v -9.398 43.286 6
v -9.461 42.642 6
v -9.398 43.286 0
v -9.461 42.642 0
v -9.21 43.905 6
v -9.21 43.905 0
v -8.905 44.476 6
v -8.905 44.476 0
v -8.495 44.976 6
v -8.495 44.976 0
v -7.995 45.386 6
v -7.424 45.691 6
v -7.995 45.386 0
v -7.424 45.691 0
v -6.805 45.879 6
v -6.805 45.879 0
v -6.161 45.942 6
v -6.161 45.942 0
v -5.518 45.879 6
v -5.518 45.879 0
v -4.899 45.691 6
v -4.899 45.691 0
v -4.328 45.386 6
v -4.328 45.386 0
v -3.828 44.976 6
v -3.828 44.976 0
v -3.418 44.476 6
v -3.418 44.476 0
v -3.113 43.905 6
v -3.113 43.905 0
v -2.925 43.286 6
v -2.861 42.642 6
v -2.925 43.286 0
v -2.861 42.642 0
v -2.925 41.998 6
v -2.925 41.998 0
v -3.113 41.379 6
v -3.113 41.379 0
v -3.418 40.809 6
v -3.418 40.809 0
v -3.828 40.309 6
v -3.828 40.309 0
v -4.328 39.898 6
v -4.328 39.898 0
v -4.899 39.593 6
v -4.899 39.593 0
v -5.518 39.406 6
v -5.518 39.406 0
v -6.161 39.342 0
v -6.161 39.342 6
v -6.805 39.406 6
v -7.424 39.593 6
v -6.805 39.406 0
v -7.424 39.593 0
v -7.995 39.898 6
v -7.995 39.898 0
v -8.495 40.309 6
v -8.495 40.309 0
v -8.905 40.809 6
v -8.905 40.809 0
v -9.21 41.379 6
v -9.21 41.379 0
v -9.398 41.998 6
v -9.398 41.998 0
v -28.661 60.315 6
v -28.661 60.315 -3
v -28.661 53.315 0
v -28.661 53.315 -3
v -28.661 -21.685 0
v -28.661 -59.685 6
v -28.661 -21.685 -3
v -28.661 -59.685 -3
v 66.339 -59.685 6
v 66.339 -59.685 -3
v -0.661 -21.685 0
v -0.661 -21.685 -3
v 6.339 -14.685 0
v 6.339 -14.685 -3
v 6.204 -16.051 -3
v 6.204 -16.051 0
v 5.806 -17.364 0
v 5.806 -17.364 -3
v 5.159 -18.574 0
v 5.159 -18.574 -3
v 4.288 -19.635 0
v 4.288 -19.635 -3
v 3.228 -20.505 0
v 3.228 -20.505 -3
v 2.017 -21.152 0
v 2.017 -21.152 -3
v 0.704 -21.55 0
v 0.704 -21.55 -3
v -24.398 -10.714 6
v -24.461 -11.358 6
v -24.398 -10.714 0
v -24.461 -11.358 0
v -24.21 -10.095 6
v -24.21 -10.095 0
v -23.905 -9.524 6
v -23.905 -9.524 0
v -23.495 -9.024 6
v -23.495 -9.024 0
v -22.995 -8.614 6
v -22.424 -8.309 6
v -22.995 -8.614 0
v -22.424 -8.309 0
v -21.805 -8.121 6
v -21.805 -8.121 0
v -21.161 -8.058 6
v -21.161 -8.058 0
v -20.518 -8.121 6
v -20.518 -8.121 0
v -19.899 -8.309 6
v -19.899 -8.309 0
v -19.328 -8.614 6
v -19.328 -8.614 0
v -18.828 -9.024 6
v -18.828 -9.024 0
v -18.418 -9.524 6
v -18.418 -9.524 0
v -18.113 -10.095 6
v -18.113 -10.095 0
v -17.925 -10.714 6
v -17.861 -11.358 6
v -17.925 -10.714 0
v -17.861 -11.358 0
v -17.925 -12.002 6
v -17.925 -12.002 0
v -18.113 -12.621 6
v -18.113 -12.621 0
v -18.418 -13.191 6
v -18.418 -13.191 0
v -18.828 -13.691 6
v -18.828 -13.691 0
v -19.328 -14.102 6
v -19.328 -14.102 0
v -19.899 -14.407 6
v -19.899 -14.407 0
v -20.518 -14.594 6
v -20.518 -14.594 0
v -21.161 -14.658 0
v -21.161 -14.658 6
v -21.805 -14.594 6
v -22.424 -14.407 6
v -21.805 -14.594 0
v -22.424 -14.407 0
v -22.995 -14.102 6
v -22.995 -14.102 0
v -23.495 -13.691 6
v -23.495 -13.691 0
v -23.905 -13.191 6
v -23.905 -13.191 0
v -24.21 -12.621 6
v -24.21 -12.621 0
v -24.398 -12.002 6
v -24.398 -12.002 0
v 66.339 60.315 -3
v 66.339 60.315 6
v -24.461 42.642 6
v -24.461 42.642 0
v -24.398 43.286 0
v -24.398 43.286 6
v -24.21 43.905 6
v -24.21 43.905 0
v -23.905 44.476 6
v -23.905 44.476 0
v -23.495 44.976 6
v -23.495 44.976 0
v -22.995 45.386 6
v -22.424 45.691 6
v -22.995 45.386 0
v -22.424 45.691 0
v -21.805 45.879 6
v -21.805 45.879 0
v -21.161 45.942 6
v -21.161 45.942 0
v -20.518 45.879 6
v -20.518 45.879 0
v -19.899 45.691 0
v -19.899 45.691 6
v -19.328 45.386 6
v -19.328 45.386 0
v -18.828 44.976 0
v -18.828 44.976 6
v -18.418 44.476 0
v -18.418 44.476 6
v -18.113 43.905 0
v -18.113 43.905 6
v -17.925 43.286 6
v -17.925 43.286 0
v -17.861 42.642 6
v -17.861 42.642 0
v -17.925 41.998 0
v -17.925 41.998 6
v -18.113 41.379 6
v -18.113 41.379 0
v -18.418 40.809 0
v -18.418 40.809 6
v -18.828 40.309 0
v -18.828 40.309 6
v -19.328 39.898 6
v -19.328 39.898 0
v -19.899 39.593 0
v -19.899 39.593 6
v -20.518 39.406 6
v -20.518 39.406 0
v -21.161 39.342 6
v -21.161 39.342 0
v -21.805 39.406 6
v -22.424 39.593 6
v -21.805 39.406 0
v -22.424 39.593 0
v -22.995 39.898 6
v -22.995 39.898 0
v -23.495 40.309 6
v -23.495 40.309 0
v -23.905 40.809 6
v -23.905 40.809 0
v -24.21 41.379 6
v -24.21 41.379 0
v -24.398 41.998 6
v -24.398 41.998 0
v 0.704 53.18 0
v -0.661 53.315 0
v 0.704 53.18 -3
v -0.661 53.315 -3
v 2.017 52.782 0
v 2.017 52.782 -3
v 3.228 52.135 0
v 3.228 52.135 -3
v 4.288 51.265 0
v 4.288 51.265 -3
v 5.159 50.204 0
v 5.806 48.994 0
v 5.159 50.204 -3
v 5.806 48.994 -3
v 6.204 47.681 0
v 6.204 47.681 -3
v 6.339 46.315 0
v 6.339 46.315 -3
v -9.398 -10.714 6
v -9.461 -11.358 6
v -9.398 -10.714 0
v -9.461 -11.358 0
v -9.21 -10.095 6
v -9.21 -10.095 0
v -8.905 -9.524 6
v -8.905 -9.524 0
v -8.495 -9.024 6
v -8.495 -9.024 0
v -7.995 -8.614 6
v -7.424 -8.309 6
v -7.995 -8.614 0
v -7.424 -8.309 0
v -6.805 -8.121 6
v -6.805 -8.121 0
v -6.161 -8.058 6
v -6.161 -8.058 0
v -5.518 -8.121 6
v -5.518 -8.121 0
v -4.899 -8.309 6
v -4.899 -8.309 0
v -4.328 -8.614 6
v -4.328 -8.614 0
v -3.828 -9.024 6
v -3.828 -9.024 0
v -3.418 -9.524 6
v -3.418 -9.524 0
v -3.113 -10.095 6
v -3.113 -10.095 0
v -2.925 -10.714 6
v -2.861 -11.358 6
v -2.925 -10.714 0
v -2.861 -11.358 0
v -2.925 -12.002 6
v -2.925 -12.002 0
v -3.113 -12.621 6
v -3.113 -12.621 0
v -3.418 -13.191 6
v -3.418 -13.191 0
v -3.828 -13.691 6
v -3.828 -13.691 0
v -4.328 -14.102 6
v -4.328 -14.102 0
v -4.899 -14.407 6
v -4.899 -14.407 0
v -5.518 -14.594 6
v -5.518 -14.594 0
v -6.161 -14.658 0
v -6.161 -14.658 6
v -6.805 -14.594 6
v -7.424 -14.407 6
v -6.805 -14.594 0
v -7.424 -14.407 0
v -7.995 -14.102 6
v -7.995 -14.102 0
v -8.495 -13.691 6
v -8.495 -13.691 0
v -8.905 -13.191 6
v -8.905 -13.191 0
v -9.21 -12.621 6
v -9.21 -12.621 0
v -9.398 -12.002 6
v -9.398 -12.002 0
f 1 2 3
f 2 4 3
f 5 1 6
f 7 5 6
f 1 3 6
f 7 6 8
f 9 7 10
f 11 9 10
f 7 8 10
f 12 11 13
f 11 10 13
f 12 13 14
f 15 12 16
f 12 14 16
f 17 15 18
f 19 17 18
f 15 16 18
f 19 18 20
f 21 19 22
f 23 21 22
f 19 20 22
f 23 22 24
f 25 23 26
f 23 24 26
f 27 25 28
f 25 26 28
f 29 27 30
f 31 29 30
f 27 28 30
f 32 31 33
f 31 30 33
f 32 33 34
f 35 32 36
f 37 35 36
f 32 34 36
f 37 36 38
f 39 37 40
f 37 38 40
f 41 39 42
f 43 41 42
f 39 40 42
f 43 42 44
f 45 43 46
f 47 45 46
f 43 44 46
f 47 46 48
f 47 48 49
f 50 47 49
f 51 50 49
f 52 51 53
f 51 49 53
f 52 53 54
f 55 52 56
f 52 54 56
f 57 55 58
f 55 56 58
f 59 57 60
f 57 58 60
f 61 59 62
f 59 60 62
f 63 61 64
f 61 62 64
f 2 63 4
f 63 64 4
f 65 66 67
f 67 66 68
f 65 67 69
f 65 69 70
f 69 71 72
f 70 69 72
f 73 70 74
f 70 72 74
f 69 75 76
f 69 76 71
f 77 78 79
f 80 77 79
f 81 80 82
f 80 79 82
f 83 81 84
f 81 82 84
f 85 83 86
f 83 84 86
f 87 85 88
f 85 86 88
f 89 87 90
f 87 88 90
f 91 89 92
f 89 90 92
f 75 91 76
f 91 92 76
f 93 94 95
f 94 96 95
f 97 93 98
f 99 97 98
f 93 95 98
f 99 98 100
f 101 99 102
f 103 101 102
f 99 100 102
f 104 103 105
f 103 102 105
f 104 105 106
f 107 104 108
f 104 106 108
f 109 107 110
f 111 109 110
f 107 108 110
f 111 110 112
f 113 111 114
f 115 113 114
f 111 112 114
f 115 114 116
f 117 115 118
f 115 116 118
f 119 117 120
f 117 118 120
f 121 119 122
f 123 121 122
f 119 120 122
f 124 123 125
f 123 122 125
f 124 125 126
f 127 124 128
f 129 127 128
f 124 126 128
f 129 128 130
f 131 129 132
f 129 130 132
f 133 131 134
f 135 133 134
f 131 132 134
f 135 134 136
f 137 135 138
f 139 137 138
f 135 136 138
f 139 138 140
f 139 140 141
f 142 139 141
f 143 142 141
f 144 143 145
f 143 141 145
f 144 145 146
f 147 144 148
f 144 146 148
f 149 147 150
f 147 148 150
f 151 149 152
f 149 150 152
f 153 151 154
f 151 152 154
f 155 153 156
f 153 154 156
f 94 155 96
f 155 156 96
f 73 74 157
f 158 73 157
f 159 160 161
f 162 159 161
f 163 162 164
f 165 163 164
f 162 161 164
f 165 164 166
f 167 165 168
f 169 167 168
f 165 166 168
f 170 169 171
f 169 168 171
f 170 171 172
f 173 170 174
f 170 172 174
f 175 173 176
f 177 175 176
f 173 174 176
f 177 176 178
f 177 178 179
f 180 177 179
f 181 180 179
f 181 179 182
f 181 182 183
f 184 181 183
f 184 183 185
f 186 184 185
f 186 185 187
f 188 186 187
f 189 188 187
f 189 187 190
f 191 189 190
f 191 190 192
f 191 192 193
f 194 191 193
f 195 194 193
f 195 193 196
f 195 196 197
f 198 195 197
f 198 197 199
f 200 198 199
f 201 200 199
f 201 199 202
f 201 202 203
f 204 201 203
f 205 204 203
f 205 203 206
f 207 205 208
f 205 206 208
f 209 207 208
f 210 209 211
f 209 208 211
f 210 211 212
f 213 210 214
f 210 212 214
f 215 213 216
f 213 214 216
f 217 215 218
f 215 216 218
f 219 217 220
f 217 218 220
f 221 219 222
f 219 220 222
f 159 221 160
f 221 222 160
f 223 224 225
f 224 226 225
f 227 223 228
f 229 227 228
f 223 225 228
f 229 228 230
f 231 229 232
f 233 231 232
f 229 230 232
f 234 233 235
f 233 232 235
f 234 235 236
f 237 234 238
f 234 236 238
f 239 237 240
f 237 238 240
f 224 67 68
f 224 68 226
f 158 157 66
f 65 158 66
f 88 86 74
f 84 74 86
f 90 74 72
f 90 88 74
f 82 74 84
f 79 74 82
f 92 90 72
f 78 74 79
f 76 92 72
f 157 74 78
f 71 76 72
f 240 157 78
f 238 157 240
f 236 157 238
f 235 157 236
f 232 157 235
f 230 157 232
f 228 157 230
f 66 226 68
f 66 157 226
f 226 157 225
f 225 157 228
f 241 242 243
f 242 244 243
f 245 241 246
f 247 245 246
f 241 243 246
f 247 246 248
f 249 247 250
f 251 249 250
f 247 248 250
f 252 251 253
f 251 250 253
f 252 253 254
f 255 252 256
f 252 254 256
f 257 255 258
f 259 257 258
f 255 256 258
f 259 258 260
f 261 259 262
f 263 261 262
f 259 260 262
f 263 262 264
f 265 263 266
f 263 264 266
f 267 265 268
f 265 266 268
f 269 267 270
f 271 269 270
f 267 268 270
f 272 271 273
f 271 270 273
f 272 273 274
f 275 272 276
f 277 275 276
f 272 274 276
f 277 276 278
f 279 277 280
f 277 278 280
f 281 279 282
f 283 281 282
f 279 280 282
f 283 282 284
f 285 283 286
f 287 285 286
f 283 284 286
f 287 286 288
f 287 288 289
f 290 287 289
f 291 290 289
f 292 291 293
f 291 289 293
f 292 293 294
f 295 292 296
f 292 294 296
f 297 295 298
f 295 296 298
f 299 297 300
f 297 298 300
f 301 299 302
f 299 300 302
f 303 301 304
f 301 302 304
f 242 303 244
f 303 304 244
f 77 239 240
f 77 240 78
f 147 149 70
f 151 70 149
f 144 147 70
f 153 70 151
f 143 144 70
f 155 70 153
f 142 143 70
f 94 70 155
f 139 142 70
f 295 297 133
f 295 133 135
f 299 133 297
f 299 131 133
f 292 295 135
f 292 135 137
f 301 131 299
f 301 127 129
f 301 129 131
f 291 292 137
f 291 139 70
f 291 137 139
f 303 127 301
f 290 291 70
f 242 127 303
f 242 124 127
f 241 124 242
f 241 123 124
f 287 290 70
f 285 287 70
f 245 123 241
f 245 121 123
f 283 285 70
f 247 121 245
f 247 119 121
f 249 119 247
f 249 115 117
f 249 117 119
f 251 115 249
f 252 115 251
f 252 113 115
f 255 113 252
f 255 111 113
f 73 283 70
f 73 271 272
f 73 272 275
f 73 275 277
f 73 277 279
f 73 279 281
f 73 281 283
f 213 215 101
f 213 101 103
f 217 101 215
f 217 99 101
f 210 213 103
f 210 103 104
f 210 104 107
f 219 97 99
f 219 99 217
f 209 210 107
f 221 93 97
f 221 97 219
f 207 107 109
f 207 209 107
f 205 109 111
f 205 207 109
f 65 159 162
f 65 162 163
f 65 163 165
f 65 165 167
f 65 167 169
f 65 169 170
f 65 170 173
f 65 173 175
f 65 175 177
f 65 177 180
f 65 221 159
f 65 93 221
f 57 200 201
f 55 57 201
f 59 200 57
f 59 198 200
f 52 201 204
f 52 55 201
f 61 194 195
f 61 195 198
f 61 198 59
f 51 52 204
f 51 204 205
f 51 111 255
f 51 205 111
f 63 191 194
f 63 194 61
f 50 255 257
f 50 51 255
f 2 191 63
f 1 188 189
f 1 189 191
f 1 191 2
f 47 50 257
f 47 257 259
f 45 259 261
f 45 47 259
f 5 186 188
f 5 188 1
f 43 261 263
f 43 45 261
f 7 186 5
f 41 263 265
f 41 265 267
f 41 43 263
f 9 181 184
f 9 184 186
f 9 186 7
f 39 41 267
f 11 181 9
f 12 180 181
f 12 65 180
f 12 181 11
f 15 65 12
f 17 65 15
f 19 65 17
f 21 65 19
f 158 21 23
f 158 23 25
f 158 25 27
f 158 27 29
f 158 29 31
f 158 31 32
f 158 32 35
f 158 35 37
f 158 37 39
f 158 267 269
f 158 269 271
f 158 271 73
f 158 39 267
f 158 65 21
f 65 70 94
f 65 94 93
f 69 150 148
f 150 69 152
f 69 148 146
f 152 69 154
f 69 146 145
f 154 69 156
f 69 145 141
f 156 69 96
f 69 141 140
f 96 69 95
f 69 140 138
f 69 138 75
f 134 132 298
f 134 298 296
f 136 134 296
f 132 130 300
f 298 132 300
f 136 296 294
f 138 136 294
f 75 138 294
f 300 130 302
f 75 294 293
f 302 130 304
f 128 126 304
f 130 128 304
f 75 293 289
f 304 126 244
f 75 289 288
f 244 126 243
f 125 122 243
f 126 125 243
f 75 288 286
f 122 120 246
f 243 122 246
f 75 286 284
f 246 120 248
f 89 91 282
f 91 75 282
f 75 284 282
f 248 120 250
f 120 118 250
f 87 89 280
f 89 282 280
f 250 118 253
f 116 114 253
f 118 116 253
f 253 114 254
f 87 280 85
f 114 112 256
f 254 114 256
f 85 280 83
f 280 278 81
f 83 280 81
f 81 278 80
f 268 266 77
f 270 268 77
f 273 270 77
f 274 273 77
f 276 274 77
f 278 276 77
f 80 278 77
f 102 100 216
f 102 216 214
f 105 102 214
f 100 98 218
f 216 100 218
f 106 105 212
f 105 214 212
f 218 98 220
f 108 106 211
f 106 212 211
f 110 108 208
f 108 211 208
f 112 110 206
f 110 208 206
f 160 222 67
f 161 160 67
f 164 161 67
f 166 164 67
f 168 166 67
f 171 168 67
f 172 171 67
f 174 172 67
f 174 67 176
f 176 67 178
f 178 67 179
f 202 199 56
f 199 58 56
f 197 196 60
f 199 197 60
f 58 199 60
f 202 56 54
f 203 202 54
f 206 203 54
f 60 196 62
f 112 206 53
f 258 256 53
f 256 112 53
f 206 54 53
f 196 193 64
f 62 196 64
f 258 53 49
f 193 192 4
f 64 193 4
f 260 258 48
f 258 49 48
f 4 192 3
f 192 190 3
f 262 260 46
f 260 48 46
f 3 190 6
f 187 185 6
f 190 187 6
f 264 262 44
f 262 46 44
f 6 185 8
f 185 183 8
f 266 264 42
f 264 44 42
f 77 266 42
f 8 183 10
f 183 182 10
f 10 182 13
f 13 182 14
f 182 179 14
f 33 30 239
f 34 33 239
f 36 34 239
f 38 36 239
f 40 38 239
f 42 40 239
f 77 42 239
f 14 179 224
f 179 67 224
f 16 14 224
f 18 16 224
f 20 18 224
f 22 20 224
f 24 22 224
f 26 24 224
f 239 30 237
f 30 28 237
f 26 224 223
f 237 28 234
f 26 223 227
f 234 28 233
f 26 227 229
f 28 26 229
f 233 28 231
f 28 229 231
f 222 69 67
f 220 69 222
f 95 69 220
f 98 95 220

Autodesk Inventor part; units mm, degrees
ref_plane "YZ Plane" through (0, 0, 0) normal (1, 0, 0) x (0, 1, 0)
ref_plane "XZ Plane" through (0, 0, 0) normal (0, 1, 0) x (-1, 0, 0)
ref_plane "XY Plane" through (0, 0, 0) normal (0, 0, 1) x (1, 0, 0)
sketch "Sketch1" plane through (0, 0, 0) normal (0, 0, 1) x (1, 0, 0)
  line L0 (-28.6614, -59.685) -> (66.3386, -59.685)
  line L1 (66.3386, -59.685) -> (66.3386, 60.315)
  line L2 (66.3386, 60.315) -> (-28.6614, 60.315)
  line L3 (-28.6614, 60.315) -> (-28.6614, -59.685)
  point P0 (0, 0)
  dimension "d0" = 120
  dimension "d1" = 95
extrude "Extrusion1" add sketch "Sketch1" along normal blind 6
sketch "Sketch3" plane through (0, 0, 0) normal (0, 0, -1) x (-1, 0, 0)
  line L0 (-66.3386, 60.315) -> (28.6614, 60.315) projected
  line L1 (28.6614, 60.315) -> (28.6614, 53.315)
  line L2 (28.6614, 60.315) -> (28.6614, -59.685) projected
  line L3 (28.6614, 53.315) -> (-6.3386, 53.315)
  line L4 (-6.3386, 53.315) -> (-6.3386, -21.685)
  line L5 (-6.3386, -21.685) -> (28.6614, -21.685)
  line L6 (28.6614, -21.685) -> (28.6614, -59.685)
  line L7 (28.6614, -59.685) -> (-66.3386, -59.685) projected
  line L8 (28.6614, -59.685) -> (-66.3386, -59.685)
  line L9 (-66.3386, -59.685) -> (-66.3386, 60.315) projected
  line L10 (-66.3386, -59.685) -> (-66.3386, 60.315)
  line L11 (-66.3386, 60.315) -> (28.6614, 60.315)
  point P0 (0, 0)
  dimension "d9" = 7
  dimension "d10" = 35
  dimension "d11" = 75
extrude "Extrusion3" add sketch "Sketch3" along normal blind 3 contours L0 L1 L3 L4 L5 L2 L7 L9
fillet "Fillet1" radius 7 2 edges at (6.3386, -21.685, -1.5) (6.3386, 53.315, -1.5)
sketch "Sketch4" plane through (0, 0, 0) normal (0, 0, -1) x (-1, 0, 0)
  circle A0 centre (6.1614, 42.6422) radius 3.3 projected
  circle A1 centre (21.1614, 42.6422) radius 3.3 projected
  circle A2 centre (21.1614, -11.3578) radius 3.3 projected
  circle A3 centre (6.1614, -11.3578) radius 3.3 projected
  point P0 (0, 0)
extrude "Extrusion4" cut sketch "Sketch4" against normal through all
properties part number "Internal support motor-ball bracket"
